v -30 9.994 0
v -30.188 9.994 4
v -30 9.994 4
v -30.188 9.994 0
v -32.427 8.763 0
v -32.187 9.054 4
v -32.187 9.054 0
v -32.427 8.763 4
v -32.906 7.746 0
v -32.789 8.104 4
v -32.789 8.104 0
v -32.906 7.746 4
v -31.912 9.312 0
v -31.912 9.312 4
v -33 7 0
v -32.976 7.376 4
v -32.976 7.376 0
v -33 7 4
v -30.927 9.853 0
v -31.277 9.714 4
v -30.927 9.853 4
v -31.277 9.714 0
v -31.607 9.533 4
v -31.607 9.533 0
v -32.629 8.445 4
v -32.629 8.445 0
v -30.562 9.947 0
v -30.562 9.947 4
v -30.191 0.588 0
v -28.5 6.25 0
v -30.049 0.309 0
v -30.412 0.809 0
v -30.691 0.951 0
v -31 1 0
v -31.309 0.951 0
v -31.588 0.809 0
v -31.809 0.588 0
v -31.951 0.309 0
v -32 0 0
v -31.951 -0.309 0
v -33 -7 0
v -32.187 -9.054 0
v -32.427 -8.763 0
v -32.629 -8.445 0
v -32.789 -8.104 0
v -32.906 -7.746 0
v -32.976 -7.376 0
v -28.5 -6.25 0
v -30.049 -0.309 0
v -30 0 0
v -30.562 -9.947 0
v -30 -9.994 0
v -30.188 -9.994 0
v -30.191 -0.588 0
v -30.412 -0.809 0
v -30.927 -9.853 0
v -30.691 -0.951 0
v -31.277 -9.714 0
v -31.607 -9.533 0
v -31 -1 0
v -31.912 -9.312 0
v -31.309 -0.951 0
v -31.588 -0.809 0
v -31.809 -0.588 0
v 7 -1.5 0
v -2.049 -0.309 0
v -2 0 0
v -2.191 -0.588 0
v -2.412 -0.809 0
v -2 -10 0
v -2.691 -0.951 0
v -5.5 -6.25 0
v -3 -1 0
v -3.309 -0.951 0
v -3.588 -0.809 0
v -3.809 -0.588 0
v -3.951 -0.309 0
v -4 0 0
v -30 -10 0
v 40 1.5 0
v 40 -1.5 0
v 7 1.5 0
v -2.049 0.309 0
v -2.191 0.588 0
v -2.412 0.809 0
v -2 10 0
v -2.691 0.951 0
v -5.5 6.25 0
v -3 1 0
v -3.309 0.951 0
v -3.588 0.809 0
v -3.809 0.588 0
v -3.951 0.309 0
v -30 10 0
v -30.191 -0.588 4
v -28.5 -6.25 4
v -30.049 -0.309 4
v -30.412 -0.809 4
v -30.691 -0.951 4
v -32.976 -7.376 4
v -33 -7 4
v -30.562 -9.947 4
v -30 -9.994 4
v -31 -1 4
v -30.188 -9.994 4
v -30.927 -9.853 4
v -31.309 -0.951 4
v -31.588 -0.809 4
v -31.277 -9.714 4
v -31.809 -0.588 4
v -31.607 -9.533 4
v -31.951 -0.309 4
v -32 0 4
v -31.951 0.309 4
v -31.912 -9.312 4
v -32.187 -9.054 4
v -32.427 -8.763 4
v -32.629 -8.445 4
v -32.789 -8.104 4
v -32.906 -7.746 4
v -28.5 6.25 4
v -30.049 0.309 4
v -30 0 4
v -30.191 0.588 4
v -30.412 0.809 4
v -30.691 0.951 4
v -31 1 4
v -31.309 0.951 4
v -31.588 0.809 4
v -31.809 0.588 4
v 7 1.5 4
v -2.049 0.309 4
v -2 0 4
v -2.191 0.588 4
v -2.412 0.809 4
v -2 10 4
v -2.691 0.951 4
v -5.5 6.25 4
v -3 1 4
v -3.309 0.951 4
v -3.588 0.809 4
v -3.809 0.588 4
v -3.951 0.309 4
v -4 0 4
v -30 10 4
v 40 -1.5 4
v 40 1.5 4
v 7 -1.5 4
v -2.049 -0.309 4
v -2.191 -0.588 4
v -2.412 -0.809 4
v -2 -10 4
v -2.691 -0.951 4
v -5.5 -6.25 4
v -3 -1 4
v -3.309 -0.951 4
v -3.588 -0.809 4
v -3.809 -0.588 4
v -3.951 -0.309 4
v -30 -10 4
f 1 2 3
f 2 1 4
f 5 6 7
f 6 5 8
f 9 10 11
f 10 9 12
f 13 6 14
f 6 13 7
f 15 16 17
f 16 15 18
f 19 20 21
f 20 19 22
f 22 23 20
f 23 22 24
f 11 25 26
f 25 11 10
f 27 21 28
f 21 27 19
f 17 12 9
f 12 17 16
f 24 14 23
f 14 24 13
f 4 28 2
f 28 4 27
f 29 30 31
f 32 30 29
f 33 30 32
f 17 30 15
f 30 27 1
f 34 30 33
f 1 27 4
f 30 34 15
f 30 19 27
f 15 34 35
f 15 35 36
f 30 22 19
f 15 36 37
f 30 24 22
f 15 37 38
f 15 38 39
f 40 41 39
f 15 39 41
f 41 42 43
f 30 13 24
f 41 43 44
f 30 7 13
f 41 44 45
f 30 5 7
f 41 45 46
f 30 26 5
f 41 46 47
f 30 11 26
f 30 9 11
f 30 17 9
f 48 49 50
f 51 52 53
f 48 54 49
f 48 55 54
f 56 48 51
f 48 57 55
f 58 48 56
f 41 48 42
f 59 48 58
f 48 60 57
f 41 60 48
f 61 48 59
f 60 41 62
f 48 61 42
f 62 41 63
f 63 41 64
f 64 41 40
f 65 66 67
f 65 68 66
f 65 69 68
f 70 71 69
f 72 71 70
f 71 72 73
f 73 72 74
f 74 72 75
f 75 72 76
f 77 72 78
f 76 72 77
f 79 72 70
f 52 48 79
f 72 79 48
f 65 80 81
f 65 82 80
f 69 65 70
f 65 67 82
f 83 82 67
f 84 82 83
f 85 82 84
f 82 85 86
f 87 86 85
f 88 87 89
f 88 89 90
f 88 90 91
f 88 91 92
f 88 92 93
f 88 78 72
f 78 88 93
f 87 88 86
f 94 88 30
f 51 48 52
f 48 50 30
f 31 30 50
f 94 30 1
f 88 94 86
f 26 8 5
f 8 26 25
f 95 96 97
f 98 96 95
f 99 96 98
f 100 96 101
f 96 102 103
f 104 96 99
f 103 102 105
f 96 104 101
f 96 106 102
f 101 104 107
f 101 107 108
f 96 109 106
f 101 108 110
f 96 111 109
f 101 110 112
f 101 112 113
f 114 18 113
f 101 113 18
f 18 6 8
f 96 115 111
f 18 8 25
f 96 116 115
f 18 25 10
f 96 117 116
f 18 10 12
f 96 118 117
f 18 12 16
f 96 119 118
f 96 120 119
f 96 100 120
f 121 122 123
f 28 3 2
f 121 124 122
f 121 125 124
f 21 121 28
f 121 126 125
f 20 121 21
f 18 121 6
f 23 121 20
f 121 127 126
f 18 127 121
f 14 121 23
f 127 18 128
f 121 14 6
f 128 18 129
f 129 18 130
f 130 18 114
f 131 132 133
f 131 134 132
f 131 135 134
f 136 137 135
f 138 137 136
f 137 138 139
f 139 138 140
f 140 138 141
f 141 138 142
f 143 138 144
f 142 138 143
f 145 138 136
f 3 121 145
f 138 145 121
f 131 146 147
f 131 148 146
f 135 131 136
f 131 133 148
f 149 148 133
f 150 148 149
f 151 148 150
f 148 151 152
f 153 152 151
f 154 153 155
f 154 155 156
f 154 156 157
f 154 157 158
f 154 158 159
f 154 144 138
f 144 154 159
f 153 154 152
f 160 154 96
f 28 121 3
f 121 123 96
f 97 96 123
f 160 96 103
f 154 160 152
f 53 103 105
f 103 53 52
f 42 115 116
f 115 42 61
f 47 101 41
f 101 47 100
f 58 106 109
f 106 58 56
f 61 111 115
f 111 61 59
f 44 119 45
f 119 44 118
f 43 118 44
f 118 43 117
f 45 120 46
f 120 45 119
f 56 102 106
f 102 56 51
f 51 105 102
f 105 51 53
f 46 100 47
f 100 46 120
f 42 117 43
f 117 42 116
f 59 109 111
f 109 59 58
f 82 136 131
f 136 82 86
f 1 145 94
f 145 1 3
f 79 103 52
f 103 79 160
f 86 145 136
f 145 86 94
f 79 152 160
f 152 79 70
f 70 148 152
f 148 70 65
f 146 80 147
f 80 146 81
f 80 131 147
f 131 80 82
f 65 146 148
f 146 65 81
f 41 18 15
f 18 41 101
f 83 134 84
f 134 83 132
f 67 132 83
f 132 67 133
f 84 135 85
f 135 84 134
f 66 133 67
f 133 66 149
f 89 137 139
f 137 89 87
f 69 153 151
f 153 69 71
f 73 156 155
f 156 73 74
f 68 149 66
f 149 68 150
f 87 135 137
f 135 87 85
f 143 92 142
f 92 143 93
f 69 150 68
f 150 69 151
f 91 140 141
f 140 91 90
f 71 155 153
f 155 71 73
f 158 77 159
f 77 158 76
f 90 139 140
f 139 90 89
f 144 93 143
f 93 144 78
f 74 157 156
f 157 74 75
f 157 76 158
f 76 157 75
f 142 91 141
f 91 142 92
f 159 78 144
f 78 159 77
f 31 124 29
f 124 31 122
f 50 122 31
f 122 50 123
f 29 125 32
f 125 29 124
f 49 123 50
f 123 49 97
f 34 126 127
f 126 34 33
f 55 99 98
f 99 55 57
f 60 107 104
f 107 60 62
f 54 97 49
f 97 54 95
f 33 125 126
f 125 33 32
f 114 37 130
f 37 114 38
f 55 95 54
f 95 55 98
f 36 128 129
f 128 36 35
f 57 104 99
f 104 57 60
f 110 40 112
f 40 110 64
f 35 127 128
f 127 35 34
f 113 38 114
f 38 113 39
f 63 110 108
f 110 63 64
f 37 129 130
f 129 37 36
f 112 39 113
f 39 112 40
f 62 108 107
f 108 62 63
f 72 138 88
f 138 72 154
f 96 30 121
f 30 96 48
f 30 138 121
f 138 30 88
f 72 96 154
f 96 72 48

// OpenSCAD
tibia();

module tibia(sl = 23, sw = 12.5){
	difference(){
		//solid parts
		union(){
			hull(){
				//main inner square
				translate([-30,-10,0]) cube([28,20,4]);
				//lower taper
				translate([5,-1.5,0]) cube([2,3,4]);
			}
	
			//leg
			translate([0,-1.5,0]) cube([40,3,4]);
			//top bar
			translate([-33,-7,0]) cube([6,14,4]);
			//rounded corners
			for (i = [ [-30,7,0],[-30,-7,0] ]){
				translate(i) cylinder(r=3,h=4,$fn=50);
			}	
		}
		//servo mounts
		for (i = [ [-3,0,-2],[-31,0,-2] ]){
			translate(i) cylinder(r=1,h=20,$fn=20);
		}
		//hole for servo body
		translate([-17,0,2])  cube([sl,sw,22], center=true);
	}
}
